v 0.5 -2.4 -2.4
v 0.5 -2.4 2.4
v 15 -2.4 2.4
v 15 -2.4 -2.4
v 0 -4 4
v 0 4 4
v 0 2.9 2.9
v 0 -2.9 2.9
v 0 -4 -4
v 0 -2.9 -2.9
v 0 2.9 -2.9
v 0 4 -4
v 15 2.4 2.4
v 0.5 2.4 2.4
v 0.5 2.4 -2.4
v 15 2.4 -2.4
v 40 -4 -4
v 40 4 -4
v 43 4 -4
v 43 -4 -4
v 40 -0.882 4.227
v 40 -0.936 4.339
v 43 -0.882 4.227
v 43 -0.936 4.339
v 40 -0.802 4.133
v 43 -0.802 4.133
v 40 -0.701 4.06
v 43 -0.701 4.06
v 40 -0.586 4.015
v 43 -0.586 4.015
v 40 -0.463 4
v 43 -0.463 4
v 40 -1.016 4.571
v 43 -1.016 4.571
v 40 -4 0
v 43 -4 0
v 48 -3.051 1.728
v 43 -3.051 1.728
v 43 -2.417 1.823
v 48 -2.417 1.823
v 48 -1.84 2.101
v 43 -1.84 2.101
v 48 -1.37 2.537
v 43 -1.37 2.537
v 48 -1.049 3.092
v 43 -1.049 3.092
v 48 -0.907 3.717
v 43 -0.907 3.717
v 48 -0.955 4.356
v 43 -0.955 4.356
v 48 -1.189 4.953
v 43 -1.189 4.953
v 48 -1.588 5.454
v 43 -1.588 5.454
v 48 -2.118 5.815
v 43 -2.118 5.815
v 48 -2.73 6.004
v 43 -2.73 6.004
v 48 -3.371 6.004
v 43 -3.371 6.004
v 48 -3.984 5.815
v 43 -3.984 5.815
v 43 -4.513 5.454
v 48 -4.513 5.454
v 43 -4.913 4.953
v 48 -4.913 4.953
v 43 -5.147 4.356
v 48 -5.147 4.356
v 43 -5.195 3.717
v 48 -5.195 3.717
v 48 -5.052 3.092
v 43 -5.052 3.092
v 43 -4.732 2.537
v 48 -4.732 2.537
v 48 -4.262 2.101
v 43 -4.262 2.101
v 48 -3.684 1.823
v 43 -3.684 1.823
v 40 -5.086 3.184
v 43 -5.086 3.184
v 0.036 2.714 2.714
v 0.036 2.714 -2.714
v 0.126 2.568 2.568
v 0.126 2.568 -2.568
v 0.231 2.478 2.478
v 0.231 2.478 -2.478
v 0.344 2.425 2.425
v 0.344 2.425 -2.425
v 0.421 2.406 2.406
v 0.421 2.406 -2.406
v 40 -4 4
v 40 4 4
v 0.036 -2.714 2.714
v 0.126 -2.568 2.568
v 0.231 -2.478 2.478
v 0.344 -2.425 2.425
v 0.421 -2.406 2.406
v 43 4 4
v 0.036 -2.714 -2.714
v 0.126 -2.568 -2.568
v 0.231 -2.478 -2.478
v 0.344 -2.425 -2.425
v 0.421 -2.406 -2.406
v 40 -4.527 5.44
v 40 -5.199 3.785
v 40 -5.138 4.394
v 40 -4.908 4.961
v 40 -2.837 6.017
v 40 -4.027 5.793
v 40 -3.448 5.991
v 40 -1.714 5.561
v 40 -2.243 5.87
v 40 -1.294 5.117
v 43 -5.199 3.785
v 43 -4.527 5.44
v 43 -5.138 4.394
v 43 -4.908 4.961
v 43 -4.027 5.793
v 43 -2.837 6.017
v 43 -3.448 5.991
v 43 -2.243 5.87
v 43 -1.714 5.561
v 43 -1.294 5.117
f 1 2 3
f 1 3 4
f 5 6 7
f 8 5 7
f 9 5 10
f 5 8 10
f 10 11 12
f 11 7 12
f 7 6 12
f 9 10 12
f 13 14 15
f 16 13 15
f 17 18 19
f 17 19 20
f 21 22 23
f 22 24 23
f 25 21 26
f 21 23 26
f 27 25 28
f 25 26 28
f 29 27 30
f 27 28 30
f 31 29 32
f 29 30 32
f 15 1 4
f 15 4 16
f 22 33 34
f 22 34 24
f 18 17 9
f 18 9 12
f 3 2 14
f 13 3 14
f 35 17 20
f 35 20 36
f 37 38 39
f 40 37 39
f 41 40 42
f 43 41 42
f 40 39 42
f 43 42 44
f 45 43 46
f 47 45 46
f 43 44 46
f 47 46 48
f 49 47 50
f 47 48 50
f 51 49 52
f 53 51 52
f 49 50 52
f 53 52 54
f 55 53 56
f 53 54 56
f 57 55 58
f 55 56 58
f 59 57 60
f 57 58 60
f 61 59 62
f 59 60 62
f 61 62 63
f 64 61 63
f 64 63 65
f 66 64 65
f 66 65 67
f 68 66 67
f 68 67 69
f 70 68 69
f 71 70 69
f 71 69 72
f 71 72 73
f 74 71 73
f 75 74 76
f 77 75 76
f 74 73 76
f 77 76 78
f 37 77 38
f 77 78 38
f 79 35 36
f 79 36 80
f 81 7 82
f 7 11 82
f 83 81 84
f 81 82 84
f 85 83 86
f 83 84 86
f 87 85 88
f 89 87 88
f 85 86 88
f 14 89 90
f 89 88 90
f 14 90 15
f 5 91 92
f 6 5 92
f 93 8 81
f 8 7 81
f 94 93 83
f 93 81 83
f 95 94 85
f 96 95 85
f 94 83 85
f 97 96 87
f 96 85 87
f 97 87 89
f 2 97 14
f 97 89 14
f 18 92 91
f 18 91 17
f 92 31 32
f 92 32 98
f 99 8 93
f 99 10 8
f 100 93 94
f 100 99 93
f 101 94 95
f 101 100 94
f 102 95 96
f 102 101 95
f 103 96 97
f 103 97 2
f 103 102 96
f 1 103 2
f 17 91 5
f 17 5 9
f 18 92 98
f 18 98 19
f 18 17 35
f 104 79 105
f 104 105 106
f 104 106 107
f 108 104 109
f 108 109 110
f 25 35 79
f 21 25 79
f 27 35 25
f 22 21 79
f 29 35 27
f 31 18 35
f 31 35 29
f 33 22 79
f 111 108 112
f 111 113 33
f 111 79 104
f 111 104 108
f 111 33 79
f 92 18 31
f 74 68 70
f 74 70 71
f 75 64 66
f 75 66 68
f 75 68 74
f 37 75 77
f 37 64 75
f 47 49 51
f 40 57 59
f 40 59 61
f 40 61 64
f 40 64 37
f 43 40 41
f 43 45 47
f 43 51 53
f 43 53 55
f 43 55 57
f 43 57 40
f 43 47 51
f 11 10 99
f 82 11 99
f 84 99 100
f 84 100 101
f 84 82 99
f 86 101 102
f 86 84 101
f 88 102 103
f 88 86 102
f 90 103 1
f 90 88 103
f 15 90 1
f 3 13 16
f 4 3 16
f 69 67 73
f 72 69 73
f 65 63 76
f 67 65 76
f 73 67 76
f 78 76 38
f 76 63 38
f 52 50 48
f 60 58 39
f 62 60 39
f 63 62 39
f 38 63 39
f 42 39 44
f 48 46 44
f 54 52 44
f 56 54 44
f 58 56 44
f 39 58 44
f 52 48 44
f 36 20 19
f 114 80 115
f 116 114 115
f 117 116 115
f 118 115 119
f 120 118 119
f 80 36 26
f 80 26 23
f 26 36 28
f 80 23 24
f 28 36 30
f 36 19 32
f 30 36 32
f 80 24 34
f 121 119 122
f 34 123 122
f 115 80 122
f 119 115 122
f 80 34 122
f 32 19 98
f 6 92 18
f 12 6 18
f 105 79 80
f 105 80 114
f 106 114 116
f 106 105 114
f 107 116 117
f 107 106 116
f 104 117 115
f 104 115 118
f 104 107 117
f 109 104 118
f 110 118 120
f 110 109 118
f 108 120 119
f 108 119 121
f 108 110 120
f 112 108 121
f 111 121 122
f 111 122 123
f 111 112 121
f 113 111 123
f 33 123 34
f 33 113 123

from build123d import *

# Parameters (mm, degrees)
SKETCH2_W           = 8
SKETCH2_H           = 8
SKETCH2_W_2         = 4.8
SKETCH2_H_2         = 4.8
BOSS_EXTRUDE1_DEPTH = 10
BOSS_EXTRUDE2_START = 15
SKETCH2_2_W         = 8
SKETCH2_2_H         = 8
BOSS_EXTRUDE2_DEPTH = 25
BOSS_EXTRUDE3_DEPTH = 3
SKETCH6_R           = 2.15
BOSS_EXTRUDE4_DEPTH = 5
BOSS_EXTRUDE5_START = 10
SKETCH2_4_W         = 8
SKETCH2_4_H         = 8
SKETCH2_4_W_2       = 4.8
SKETCH2_4_H_2       = 4.8
BOSS_EXTRUDE5_DEPTH = 5
FILLET1_R           = 0.5
FILLET2_R           = 0.5


with BuildPart() as part:
    # Sketch2 → Boss-Extrude1 (new body)
    with BuildSketch(Plane(origin=(0, 0, 0), x_dir=(0, 0, -1), z_dir=(1, 0, 0))):
        Rectangle(SKETCH2_W, SKETCH2_H)
        Rectangle(SKETCH2_W_2, SKETCH2_H_2, mode=Mode.SUBTRACT)
    extrude(amount=BOSS_EXTRUDE1_DEPTH)



with BuildPart() as body_2:
    # Sketch2<2> → Boss-Extrude2 (new body)
    with BuildSketch(Plane(origin=(0, 0, 0), x_dir=(0, 0, -1), z_dir=(1, 0, 0)).offset(BOSS_EXTRUDE2_START)):
        Rectangle(SKETCH2_2_W, SKETCH2_2_H)
    extrude(amount=BOSS_EXTRUDE2_DEPTH)


with BuildPart() as body_3:
    # Sketch5 → Boss-Extrude3 (new body)
    with BuildSketch(Plane(origin=(40, 0, 0), x_dir=(0, 0, -1), z_dir=(1, 0, 0))):
        with BuildLine():
            Line((-4, 4), (4, 4))
            Line((4, 4), (4, -4))
            Line((4, -4), (0, -4))
            Line((0, -4), (-3.183580068, -5.085658744))
            ThreePointArc((-3.183580068, -5.085658744), (-5.912457005, -3.744677514), (-4.571475775, -1.015800576))
            Line((-4.571475775, -1.015800576), (-4, -0.820916936))
            Line((-4, -0.820916936), (-4, 4))
        make_face()
    extrude(amount=BOSS_EXTRUDE3_DEPTH)

    # Fillet2
    fillet2_edges = [body_3.edges().sort_by_distance(p)[0] for p in [
        (41.5, -0.820916936, 4),
    ]]
    fillet(fillet2_edges, radius=FILLET2_R)


with BuildPart() as body_4:
    # Sketch6 → Boss-Extrude4 (new body)
    with BuildSketch(Plane(origin=(43, 0, 0), x_dir=(0, 0, -1), z_dir=(1, 0, 0))):
        with Locations((-3.877527921, -3.05072966)):
            Circle(SKETCH6_R)
    extrude(amount=BOSS_EXTRUDE4_DEPTH)


with BuildPart() as part_1:
    add(part.part)

    add(body_2.part)  # Boss-Extrude5 merges body 2
    # Sketch2<4> → Boss-Extrude5 (add)
    with BuildSketch(Plane(origin=(0, 0, 0), x_dir=(0, 0, -1), z_dir=(1, 0, 0)).offset(BOSS_EXTRUDE5_START)):
        Rectangle(SKETCH2_4_W, SKETCH2_4_H)
        Rectangle(SKETCH2_4_W_2, SKETCH2_4_H_2, mode=Mode.SUBTRACT)
    extrude(amount=BOSS_EXTRUDE5_DEPTH)

    # Fillet1
    fillet1_edges = [part_1.edges().sort_by_distance(p)[0] for p in [
        (0, -2.4, 0),
        (0, 0, -2.4),
        (0, 0, 2.4),
        (0, 2.4, 0),
    ]]
    fillet(fillet1_edges, radius=FILLET1_R)


solid = Compound([body_3.part, body_4.part, part_1.part])
